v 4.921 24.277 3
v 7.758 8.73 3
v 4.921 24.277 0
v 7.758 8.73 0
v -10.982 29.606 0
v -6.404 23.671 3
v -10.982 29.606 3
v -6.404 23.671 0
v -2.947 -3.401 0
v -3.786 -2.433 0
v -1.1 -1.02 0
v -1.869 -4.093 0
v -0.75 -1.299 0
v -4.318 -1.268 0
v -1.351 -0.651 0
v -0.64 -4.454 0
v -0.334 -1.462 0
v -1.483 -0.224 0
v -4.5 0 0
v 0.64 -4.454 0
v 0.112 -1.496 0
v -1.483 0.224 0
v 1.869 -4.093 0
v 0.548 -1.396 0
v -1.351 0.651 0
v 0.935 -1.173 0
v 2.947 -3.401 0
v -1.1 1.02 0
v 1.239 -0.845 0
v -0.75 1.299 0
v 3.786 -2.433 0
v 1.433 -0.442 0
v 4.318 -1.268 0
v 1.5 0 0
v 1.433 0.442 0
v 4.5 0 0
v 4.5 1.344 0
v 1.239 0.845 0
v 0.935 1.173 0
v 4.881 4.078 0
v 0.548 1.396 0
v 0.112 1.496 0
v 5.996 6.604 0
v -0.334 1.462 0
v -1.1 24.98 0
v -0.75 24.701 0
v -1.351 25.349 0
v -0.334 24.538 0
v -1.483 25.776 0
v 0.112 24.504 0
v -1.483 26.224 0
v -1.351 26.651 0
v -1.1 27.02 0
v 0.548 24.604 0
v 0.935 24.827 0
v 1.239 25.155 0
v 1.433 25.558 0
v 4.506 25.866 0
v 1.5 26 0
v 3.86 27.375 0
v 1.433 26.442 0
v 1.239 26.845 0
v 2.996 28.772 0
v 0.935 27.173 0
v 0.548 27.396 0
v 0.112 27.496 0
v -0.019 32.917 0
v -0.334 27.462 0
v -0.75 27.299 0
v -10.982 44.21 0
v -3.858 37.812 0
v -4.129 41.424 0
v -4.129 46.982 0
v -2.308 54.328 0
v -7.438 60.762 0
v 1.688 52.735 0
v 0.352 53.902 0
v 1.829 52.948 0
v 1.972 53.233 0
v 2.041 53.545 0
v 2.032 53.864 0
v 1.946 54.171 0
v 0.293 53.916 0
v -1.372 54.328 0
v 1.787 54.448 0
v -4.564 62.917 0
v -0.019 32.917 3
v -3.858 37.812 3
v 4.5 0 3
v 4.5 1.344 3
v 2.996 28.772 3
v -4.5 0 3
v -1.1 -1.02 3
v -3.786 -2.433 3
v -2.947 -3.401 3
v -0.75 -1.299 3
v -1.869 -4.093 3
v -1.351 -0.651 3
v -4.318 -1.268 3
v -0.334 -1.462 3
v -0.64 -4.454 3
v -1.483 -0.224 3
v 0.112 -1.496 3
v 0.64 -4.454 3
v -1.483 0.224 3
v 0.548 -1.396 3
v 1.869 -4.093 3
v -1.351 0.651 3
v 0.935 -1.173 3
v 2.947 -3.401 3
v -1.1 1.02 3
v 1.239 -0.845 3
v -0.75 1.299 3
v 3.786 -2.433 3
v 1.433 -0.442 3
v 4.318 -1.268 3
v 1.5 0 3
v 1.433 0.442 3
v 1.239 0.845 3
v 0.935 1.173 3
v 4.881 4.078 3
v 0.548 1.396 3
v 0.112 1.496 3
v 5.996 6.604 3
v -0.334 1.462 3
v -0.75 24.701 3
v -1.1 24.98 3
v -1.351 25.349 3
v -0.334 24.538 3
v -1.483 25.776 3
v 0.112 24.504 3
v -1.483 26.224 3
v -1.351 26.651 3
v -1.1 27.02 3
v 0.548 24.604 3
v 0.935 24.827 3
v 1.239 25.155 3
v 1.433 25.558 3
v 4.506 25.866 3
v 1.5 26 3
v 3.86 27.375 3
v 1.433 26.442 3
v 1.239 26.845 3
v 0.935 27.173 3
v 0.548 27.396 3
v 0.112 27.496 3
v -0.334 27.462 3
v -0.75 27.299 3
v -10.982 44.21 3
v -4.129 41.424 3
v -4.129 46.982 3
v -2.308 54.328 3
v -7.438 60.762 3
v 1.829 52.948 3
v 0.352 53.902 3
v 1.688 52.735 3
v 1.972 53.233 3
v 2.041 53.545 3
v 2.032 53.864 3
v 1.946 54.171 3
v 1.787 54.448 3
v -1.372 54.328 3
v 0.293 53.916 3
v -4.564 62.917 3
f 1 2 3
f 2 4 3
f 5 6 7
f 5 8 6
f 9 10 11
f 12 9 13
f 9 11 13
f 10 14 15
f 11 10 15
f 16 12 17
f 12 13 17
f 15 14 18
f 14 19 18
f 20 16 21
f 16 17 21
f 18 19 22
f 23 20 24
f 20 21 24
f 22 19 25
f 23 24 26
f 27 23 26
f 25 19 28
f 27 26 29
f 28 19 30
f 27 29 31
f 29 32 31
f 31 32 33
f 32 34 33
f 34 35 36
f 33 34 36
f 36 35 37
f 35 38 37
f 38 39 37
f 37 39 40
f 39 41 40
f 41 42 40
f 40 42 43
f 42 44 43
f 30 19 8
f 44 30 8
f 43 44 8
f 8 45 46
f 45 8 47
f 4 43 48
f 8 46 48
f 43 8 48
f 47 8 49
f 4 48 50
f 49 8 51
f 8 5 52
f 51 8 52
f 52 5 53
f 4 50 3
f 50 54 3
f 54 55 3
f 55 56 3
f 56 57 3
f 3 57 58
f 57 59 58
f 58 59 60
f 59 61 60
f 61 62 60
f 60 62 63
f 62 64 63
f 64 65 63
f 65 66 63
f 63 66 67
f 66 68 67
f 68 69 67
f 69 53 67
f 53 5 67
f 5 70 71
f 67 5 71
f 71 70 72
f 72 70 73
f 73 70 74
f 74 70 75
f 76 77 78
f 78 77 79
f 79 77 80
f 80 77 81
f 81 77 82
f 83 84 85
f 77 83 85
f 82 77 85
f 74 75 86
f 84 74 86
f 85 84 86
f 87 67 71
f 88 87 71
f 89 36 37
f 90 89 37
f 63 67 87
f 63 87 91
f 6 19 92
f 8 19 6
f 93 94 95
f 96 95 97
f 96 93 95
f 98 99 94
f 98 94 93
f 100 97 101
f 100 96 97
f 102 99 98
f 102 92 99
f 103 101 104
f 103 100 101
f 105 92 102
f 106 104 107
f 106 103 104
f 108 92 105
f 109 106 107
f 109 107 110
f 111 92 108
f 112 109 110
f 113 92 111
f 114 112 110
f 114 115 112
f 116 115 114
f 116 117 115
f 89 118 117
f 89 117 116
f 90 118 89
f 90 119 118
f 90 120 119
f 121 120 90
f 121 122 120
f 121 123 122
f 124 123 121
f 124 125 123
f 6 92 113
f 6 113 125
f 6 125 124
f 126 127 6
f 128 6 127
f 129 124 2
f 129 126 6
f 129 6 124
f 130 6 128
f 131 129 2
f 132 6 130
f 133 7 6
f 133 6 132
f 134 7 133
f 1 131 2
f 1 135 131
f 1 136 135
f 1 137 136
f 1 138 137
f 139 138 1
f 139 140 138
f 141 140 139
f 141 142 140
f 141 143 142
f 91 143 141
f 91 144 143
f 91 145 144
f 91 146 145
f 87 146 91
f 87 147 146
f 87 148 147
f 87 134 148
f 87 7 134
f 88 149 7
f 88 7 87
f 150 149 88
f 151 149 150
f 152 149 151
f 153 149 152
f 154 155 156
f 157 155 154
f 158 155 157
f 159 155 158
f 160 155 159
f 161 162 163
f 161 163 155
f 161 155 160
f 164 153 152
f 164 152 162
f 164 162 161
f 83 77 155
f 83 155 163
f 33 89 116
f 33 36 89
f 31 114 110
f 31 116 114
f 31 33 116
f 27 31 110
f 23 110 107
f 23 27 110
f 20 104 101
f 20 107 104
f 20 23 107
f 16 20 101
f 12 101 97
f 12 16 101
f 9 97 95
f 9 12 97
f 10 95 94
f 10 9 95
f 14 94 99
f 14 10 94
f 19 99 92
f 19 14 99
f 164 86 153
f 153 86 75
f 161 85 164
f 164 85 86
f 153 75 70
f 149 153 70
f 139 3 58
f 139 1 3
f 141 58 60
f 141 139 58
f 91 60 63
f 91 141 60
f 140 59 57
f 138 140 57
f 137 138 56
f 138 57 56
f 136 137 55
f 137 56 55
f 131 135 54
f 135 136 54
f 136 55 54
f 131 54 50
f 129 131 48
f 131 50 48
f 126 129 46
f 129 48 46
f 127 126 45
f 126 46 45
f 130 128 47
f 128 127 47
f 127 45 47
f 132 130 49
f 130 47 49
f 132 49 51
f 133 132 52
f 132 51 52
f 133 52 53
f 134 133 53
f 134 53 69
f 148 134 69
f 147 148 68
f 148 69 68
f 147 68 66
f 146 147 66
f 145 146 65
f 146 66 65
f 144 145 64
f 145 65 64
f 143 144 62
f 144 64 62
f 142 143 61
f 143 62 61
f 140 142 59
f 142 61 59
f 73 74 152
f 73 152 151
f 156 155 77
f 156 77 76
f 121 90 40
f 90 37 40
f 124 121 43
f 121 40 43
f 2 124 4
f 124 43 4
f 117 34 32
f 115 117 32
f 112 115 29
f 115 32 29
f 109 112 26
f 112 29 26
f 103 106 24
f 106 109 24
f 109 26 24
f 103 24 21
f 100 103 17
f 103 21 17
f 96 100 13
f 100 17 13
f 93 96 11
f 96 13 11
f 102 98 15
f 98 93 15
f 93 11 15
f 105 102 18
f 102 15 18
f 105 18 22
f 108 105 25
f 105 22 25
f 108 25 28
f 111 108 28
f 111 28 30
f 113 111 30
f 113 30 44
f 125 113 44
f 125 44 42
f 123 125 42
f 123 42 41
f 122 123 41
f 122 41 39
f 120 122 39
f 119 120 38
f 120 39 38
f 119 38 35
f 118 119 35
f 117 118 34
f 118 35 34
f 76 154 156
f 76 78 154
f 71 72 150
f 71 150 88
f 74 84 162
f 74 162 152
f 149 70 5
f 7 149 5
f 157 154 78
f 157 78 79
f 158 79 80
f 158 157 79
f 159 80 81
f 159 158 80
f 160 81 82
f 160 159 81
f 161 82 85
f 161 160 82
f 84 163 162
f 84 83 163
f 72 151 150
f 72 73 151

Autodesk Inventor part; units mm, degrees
ref_plane "YZ Plane" through (0, 0, 0) normal (1, 0, 0) x (0, 1, 0)
ref_plane "XZ Plane" through (0, 0, 0) normal (0, 1, 0) x (-1, 0, 0)
ref_plane "XY Plane" through (0, 0, 0) normal (0, 0, 1) x (1, 0, 0)
sketch "Sketch1" plane through (0, 0, 0) normal (0, 0, 1) x (1, 0, 0)
  circle A0 centre (0, 0) radius 1.5
  circle A1 centre (0, 26) radius 1.5
  arc A2 (-4.5, 0) -> (4.5, 0) centre (0, 0) ccw
  line L0 (4.5, 0) -> (4.5, 7.98)
  line L1 (-4.5, 0) -> (-6.4045, 23.6711)
  line L2 (-4.5, 0) -> (21.43, 0) construction
  line L3 (4.5, 7.98) -> (7.7584, 8.7295)
  line L4 (-1.4921, 25.8465) -> (17.6104, 25.8465) construction
  line L5 (-1.372, 54.3276) -> (-2.3083, 54.3276)
  line L6 (-4.5641, 62.9172) -> (-7.4382, 60.7619)
  line L7 (7.7584, 8.7295) -> (4.4705, 26.7439)
  line L8 (-0.0191, 32.9172) -> (4.4705, 26.7439)
  line L9 (0.2933, 53.9165) -> (-1.372, 54.3276)
  line L10 (-4.1293, 46.9816) -> (-4.1293, 41.4235)
  line L11 (-4.1293, 41.4235) -> (-3.8585, 37.8118)
  line L12 (-10.9822, 44.2097) -> (-10.9822, 29.6062)
  line L13 (2.3383, 53.7129) -> (1.6877, 52.735)
  line L14 (-7.4382, 60.7619) -> (-10.9822, 44.2097)
  line L15 (-2.3083, 54.3276) -> (-4.1293, 46.9816)
  line L16 (-6.4045, 23.6711) -> (-10.9822, 29.6062)
  line L17 (-0.0191, 32.9172) -> (-3.8585, 37.8118)
  line L18 (0.3525, 53.9019) -> (1.6877, 52.735)
  line L19 (2.3383, 53.7129) -> (-4.5641, 62.9172)
  line L20 (0.3525, 53.9019) -> (0.2933, 53.9165)
  dimension "d1" = 3
  dimension "d0" = 3
  dimension "d2" = 26
  dimension "d3" = 9
  dimension "d4" = 7.98
  dimension "d6" = 94.6
extrude "Extrusion1" add sketch "Sketch1" along normal blind 3
fillet "Fillet1" radius 10 1 edges at (4.5, 7.98, 1.5)
fillet "Fillet6" radius 11 1 edges at (4.4705, 26.7439, 1.5)
fillet "Fillet7" radius 1.3 1 edges at (2.3383, 53.7129, 1.5)
properties part number "grip1a" material "ABS Plastic"
